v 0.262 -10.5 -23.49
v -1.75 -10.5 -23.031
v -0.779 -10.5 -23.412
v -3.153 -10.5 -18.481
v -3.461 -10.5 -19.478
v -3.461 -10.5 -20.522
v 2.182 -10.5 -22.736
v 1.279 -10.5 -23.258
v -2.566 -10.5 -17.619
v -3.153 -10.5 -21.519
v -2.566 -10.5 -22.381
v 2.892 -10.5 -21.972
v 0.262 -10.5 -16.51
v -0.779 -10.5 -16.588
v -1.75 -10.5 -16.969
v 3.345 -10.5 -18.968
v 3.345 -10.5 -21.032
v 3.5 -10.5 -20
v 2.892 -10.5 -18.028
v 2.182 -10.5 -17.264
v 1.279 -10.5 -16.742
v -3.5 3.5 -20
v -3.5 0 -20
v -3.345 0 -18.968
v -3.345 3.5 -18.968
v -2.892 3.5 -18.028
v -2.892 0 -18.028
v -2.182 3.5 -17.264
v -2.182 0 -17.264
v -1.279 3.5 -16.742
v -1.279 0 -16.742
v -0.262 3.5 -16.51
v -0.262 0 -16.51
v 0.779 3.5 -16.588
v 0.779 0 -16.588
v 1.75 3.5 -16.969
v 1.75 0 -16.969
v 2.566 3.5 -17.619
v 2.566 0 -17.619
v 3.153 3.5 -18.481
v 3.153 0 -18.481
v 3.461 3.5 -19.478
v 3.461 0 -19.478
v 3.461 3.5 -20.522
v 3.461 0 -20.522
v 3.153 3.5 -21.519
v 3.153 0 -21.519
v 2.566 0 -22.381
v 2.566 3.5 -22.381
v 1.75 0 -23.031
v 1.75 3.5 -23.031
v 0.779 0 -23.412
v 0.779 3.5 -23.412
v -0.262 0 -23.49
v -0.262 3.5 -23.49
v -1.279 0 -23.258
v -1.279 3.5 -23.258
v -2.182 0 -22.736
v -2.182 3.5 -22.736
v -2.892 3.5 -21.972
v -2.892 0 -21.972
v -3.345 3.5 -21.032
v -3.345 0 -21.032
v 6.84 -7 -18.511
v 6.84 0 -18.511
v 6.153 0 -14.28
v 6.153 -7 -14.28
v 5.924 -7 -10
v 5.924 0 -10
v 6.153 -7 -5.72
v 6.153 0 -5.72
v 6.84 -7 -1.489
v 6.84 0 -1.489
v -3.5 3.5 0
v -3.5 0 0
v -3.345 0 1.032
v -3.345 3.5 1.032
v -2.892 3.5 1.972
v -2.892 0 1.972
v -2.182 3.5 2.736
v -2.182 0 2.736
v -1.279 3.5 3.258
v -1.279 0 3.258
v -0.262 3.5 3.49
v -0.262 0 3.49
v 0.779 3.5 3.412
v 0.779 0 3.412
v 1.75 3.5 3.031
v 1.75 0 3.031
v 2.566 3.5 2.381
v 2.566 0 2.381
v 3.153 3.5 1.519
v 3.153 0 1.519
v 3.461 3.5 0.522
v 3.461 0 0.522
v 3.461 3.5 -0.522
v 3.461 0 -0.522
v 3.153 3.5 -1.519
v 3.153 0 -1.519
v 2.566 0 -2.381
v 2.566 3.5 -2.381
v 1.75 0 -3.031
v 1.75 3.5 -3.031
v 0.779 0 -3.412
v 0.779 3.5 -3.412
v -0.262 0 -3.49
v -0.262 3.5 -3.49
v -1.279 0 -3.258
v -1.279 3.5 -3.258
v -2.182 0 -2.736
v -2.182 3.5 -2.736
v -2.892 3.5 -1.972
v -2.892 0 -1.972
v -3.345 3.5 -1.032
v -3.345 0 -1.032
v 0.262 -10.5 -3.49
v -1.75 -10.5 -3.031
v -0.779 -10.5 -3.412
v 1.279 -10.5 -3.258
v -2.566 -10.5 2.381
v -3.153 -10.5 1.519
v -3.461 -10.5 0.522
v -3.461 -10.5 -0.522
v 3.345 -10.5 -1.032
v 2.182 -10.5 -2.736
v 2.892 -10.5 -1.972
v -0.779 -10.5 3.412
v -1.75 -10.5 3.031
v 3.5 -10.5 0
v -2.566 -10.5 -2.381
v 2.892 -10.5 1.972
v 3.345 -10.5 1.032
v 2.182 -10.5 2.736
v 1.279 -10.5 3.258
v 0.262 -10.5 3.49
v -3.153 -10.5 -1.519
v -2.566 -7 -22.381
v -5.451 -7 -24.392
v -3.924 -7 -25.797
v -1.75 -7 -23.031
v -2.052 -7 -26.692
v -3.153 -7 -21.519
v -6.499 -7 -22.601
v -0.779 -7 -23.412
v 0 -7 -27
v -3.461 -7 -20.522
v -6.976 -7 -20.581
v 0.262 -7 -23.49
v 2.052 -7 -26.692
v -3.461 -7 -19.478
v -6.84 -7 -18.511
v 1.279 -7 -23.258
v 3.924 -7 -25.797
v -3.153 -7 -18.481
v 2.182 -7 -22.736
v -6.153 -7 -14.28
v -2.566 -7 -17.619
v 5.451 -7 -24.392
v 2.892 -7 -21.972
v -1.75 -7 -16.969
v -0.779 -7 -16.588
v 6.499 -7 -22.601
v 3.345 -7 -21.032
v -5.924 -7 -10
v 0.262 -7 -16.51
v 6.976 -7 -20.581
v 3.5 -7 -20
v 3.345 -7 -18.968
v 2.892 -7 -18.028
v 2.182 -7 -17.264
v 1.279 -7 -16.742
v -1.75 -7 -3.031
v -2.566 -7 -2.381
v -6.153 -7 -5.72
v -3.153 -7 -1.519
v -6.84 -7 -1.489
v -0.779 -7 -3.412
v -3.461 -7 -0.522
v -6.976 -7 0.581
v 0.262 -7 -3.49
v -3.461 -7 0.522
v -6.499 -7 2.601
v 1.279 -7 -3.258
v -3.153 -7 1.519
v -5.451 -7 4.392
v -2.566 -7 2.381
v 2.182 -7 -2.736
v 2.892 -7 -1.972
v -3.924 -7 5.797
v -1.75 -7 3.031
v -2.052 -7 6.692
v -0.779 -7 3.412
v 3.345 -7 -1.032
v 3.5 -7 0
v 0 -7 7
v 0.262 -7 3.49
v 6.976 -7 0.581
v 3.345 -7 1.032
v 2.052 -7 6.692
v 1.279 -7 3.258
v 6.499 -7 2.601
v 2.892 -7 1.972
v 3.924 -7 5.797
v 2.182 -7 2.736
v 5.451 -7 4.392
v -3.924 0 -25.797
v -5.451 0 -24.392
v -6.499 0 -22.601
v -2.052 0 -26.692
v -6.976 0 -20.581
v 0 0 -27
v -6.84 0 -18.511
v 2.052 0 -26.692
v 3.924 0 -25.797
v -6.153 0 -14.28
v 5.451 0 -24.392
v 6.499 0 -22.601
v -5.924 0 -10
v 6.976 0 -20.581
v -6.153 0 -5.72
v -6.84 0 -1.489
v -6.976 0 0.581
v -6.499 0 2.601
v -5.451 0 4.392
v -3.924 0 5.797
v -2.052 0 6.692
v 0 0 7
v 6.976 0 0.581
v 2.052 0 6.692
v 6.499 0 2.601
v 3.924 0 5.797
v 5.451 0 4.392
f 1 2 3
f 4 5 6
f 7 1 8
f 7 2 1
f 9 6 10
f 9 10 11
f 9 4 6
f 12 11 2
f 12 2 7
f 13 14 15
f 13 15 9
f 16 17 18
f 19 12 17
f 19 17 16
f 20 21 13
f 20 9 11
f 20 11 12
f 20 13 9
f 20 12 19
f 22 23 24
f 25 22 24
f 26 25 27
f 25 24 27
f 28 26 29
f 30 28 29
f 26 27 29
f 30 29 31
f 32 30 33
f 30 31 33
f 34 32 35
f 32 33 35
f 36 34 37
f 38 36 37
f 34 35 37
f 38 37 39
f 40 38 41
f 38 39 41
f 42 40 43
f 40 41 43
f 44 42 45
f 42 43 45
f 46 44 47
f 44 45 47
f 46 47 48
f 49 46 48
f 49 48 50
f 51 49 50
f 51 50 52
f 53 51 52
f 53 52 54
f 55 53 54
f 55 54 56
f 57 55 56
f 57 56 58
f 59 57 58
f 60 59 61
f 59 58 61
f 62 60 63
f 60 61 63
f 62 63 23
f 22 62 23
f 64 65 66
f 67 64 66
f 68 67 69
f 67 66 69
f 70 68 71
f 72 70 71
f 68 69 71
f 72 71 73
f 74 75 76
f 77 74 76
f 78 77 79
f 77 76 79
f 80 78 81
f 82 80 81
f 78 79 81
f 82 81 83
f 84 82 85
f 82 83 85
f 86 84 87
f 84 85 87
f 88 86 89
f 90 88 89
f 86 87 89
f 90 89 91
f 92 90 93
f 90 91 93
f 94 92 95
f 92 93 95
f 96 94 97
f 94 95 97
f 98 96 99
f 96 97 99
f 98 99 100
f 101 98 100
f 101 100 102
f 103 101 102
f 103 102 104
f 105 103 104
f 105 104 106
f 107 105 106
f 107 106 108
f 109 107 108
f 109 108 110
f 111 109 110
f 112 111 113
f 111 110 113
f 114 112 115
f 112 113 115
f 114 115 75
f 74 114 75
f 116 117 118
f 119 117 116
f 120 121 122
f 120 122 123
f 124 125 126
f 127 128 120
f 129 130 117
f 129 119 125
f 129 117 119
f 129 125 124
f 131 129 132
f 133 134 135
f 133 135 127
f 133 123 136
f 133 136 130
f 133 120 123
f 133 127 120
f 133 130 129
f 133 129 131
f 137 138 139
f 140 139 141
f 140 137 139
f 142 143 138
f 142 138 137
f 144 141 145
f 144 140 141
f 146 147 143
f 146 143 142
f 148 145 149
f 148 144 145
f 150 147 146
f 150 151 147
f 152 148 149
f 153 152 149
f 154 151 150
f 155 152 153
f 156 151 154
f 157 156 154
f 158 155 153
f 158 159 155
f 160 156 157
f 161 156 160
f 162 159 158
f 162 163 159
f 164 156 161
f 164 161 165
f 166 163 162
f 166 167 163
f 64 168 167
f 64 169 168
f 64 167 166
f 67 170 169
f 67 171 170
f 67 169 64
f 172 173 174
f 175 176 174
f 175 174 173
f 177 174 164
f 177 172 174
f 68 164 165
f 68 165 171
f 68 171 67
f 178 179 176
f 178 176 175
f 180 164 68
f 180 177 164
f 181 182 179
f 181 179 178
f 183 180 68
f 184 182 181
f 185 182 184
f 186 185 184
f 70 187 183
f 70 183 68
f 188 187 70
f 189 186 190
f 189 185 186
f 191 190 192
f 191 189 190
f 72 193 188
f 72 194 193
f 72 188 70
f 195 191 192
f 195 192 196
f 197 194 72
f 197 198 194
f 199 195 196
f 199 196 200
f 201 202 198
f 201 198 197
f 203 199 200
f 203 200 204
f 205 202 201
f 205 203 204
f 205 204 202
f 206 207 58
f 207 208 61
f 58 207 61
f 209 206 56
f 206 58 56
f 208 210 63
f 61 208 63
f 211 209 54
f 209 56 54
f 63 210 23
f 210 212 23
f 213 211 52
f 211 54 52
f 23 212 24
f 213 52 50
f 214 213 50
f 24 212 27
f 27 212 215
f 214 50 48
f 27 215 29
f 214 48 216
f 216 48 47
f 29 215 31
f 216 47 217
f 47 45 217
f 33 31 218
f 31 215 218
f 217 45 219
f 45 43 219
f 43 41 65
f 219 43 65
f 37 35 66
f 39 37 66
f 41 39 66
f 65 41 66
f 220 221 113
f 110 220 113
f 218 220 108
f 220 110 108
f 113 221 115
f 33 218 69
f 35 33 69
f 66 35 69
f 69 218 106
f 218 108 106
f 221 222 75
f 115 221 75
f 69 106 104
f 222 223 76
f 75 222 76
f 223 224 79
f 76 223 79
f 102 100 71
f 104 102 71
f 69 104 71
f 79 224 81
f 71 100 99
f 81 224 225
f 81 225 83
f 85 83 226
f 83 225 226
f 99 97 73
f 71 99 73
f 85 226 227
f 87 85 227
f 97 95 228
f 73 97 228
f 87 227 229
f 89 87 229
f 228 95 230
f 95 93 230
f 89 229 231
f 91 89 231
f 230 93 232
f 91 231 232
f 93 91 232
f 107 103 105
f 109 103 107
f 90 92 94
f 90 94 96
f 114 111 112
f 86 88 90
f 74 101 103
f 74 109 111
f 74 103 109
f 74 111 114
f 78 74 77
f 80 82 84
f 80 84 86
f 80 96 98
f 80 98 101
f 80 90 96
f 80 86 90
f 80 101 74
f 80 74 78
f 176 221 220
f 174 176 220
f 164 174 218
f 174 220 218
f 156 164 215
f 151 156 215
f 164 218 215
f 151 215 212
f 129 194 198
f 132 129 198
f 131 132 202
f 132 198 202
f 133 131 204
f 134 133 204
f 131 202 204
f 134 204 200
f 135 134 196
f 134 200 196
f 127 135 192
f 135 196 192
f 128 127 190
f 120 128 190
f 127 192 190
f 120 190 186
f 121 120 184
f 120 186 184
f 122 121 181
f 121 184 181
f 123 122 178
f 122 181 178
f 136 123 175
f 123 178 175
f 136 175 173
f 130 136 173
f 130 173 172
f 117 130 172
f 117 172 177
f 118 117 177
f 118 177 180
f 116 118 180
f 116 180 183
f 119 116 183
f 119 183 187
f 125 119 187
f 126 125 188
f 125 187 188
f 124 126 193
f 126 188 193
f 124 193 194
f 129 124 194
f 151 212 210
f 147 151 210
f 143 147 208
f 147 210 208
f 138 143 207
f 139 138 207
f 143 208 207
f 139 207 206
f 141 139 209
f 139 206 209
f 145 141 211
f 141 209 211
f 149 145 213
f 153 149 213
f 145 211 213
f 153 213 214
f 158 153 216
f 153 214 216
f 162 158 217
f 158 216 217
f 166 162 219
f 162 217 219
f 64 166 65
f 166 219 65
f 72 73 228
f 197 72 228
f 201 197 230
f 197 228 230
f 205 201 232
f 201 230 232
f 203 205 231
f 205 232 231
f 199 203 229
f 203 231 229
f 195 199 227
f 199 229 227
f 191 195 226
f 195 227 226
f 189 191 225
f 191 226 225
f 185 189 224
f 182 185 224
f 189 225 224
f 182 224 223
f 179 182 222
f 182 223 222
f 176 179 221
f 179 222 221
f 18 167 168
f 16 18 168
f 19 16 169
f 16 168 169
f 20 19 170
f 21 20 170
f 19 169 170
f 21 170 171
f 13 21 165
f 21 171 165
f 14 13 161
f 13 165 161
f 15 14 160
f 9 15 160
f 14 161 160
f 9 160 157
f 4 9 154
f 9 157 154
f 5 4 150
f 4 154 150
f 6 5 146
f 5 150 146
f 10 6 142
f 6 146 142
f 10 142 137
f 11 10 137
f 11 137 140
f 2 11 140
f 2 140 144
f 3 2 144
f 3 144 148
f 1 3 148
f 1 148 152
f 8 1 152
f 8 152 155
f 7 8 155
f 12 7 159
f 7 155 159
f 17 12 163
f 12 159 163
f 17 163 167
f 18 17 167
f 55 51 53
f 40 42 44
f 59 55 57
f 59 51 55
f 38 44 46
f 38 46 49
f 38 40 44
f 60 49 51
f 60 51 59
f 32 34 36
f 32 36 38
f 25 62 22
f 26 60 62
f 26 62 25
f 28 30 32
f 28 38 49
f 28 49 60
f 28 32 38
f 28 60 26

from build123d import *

# Parameters (mm, degrees)
F1_DEPTH = 7
F2_R     = 3.5
F3_DEPTH = 3.5
F4_R     = 3.5
F5_DEPTH = 3.5


with BuildPart() as f1:
    # F0 (on Front) → F1 (new body)
    with BuildSketch(Plane.XZ):
        with BuildLine():
            ThreePointArc((6.839722, -18.510638), (5.92385, -10), (6.839722, -1.489362))
            ThreePointArc((6.839722, -1.489362), (0, 7), (-6.839722, -1.489362))
            ThreePointArc((-6.839722, -1.489362), (-5.92385, -10), (-6.839722, -18.510638))
            ThreePointArc((-6.839722, -18.510638), (0, -27), (6.839722, -18.510638))
        make_face()
    extrude(amount=F1_DEPTH)

    # F2 (on face) → F3 (join)
    with BuildSketch(Plane(origin=(0, 0, 0), x_dir=(-1, 0, 0), z_dir=(0, 1, 0))):
        Circle(F2_R)
        with Locations((0, -20)):
            Circle(F2_R)
    extrude(amount=F3_DEPTH)

    # F4 (on face) → F5 (join)
    with BuildSketch(Plane.XZ.offset(7)):
        Circle(F4_R)
        with Locations((0, -20)):
            Circle(F4_R)
    extrude(amount=F5_DEPTH)


solid = f1.part
